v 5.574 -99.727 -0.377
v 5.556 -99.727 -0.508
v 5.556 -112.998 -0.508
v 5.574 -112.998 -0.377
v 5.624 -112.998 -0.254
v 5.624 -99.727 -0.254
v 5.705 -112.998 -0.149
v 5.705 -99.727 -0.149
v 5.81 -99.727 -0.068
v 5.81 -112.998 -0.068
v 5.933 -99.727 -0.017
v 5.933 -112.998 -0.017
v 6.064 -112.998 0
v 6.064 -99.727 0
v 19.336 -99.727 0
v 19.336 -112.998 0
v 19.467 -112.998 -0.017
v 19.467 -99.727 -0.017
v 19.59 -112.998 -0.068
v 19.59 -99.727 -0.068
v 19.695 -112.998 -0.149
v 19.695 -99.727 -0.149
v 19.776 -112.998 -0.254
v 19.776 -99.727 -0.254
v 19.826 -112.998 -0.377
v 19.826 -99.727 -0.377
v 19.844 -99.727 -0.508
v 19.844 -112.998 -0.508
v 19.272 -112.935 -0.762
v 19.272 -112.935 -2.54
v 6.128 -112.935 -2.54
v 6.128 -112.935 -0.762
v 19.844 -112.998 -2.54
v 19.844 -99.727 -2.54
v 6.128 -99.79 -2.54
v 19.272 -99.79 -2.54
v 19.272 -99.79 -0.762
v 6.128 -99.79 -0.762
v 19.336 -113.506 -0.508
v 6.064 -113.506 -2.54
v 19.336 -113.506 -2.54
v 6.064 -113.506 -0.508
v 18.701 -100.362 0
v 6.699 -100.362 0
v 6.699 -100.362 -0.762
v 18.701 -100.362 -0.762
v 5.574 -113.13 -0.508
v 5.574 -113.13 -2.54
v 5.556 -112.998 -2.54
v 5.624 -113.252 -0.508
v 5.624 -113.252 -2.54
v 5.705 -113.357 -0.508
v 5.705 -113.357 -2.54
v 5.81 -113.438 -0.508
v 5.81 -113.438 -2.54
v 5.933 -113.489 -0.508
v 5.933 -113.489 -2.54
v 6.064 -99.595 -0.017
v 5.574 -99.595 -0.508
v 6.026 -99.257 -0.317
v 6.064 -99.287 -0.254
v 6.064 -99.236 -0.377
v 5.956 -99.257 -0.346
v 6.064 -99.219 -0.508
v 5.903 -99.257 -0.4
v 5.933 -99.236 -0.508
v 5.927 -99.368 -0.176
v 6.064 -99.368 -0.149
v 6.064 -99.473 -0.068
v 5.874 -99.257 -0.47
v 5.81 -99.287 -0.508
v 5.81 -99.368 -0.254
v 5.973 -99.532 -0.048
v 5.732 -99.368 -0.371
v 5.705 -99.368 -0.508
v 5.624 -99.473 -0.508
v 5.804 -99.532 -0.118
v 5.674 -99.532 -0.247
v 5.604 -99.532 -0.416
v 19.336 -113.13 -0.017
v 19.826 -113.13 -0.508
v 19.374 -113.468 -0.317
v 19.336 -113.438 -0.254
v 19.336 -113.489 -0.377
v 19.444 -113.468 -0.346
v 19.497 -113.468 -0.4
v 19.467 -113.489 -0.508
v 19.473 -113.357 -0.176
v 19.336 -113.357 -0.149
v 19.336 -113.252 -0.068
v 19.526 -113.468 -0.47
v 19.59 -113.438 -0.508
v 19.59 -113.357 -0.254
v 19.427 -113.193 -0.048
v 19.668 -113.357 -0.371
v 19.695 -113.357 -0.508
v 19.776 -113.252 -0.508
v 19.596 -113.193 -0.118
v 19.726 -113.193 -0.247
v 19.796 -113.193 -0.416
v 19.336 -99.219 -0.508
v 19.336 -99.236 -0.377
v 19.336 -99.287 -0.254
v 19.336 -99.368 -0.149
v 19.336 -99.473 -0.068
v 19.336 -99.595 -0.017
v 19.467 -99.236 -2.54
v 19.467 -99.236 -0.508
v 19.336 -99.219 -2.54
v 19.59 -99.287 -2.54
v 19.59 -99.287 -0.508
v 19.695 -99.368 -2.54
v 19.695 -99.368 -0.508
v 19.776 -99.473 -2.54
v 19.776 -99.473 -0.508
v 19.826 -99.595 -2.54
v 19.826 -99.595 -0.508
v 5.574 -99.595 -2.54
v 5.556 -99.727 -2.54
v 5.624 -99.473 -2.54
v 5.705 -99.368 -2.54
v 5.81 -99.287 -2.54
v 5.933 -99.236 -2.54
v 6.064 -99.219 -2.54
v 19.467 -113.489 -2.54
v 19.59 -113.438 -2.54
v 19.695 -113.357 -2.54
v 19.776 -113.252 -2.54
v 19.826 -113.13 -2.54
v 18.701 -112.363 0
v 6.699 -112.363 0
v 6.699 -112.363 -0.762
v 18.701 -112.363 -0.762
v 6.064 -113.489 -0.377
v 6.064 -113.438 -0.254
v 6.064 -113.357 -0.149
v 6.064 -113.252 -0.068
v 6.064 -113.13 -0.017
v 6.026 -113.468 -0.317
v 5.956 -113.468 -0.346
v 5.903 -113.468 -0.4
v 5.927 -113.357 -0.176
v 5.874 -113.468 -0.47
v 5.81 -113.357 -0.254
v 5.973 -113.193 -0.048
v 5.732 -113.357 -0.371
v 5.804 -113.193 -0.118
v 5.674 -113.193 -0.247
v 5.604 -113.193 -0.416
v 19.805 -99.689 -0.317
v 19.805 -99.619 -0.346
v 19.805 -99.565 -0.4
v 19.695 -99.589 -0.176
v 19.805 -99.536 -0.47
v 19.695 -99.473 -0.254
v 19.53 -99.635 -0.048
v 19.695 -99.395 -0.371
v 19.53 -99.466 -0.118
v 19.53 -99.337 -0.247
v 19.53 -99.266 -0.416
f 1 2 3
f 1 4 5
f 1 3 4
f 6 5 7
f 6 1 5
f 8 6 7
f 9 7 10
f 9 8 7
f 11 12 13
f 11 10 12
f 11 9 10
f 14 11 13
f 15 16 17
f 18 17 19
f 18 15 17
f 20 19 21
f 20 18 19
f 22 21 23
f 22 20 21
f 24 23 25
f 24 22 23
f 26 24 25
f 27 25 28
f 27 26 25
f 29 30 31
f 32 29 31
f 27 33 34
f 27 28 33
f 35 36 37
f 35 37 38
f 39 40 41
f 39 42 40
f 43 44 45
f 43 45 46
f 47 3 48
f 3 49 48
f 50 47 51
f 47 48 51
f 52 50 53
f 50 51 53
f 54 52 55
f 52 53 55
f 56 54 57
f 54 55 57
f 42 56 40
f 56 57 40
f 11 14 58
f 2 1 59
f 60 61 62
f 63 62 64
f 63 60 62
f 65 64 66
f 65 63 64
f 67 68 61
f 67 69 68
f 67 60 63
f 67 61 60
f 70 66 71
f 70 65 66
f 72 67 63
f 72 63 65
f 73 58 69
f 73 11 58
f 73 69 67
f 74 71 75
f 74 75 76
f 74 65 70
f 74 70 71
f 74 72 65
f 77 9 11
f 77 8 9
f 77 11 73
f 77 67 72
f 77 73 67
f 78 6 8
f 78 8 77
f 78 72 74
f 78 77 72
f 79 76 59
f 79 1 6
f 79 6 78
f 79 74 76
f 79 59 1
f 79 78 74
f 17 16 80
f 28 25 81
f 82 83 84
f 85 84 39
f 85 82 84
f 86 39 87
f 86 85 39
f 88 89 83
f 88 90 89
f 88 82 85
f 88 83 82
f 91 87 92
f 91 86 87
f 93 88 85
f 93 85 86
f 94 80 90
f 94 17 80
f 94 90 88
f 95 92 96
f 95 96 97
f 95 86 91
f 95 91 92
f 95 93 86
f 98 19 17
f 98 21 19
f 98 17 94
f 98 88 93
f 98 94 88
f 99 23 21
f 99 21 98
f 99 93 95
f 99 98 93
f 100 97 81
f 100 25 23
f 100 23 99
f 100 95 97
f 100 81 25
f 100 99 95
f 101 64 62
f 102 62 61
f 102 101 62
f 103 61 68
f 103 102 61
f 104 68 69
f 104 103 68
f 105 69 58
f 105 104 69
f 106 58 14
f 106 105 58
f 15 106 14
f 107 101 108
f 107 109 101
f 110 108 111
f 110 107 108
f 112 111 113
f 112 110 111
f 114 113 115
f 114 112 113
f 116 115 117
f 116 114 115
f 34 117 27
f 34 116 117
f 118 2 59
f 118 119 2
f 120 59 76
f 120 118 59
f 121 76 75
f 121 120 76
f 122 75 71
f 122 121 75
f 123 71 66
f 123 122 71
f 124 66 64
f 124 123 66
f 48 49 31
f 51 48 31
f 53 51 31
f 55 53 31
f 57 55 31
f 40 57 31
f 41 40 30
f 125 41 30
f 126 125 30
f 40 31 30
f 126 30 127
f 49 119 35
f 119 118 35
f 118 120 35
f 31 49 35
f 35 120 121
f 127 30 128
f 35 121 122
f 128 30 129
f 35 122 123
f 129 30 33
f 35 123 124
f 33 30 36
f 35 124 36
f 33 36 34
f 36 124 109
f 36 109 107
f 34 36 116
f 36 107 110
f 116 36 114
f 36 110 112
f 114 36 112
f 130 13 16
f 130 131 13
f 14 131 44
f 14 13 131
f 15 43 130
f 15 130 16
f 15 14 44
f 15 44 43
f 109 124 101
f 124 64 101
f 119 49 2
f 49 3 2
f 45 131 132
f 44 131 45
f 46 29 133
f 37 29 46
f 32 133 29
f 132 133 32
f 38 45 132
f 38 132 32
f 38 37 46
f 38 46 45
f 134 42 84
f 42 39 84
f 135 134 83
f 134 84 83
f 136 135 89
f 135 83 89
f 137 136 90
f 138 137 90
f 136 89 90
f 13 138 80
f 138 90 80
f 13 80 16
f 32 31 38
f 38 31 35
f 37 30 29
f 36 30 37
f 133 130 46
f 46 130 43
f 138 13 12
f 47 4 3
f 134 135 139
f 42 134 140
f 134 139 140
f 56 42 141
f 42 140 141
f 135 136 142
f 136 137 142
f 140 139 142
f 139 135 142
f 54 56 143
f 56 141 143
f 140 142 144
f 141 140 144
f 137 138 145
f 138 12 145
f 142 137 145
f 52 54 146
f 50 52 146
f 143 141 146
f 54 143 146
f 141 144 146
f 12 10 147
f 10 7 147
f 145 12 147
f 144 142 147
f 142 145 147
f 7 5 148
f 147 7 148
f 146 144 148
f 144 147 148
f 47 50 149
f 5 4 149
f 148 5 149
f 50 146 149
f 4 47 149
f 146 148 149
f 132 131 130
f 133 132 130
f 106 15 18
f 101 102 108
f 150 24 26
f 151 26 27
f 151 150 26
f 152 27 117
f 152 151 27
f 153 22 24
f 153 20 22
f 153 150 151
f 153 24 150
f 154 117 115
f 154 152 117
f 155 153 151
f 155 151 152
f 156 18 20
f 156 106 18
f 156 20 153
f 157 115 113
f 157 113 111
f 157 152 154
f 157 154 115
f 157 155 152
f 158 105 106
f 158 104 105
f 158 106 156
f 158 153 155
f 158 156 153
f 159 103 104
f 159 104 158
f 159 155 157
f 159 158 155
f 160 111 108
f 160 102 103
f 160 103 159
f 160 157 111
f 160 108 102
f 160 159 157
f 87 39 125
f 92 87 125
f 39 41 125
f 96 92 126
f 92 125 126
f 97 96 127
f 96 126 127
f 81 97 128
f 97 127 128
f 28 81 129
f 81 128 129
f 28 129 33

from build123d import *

# Parameters (mm, degrees)
SKETCH1_W           = 14.2875
SKETCH1_H           = 14.2875
SKETCH1_W_2         = 12.0015
SKETCH1_H_2         = 12.0015
BOSS_EXTRUDE1_DEPTH = 2.54
SKETCH2_W           = 13.1445
SKETCH2_H           = 13.1445
CUT_EXTRUDE1_DEPTH  = 1.778
FILLET1_R           = 0.508


with BuildPart() as part:
    # Sketch1 → Boss-Extrude1 (new body)
    with BuildSketch(Plane.XY):
        with Locations((12.7, -106.3625)):
            Rectangle(SKETCH1_W, SKETCH1_H)
        with Locations((12.7, -106.3625)):
            Rectangle(SKETCH1_W_2, SKETCH1_H_2, mode=Mode.SUBTRACT)
    extrude(amount=-BOSS_EXTRUDE1_DEPTH)

    # Sketch2 → Cut-Extrude1 (cut)
    with BuildSketch(Plane(origin=(0, 0, -2.54), x_dir=(-1, 0, 0), z_dir=(0, 0, -1))):
        with Locations((-12.7, -106.3625)):
            Rectangle(SKETCH2_W, SKETCH2_H)
    extrude(amount=-CUT_EXTRUDE1_DEPTH, mode=Mode.SUBTRACT)

    # Fillet1
    fillet1_edges = [part.edges().sort_by_distance(p)[0] for p in [
        (5.55625, -106.3625, 0),
        (12.7, -99.21875, 0),
        (19.84375, -106.3625, 0),
        (12.7, -113.50625, 0),
        (5.55625, -113.50625, -1.27),
        (5.55625, -99.21875, -1.27),
        (19.84375, -99.21875, -1.27),
        (19.84375, -113.50625, -1.27),
    ]]
    fillet(fillet1_edges, radius=FILLET1_R)


solid = part.part
